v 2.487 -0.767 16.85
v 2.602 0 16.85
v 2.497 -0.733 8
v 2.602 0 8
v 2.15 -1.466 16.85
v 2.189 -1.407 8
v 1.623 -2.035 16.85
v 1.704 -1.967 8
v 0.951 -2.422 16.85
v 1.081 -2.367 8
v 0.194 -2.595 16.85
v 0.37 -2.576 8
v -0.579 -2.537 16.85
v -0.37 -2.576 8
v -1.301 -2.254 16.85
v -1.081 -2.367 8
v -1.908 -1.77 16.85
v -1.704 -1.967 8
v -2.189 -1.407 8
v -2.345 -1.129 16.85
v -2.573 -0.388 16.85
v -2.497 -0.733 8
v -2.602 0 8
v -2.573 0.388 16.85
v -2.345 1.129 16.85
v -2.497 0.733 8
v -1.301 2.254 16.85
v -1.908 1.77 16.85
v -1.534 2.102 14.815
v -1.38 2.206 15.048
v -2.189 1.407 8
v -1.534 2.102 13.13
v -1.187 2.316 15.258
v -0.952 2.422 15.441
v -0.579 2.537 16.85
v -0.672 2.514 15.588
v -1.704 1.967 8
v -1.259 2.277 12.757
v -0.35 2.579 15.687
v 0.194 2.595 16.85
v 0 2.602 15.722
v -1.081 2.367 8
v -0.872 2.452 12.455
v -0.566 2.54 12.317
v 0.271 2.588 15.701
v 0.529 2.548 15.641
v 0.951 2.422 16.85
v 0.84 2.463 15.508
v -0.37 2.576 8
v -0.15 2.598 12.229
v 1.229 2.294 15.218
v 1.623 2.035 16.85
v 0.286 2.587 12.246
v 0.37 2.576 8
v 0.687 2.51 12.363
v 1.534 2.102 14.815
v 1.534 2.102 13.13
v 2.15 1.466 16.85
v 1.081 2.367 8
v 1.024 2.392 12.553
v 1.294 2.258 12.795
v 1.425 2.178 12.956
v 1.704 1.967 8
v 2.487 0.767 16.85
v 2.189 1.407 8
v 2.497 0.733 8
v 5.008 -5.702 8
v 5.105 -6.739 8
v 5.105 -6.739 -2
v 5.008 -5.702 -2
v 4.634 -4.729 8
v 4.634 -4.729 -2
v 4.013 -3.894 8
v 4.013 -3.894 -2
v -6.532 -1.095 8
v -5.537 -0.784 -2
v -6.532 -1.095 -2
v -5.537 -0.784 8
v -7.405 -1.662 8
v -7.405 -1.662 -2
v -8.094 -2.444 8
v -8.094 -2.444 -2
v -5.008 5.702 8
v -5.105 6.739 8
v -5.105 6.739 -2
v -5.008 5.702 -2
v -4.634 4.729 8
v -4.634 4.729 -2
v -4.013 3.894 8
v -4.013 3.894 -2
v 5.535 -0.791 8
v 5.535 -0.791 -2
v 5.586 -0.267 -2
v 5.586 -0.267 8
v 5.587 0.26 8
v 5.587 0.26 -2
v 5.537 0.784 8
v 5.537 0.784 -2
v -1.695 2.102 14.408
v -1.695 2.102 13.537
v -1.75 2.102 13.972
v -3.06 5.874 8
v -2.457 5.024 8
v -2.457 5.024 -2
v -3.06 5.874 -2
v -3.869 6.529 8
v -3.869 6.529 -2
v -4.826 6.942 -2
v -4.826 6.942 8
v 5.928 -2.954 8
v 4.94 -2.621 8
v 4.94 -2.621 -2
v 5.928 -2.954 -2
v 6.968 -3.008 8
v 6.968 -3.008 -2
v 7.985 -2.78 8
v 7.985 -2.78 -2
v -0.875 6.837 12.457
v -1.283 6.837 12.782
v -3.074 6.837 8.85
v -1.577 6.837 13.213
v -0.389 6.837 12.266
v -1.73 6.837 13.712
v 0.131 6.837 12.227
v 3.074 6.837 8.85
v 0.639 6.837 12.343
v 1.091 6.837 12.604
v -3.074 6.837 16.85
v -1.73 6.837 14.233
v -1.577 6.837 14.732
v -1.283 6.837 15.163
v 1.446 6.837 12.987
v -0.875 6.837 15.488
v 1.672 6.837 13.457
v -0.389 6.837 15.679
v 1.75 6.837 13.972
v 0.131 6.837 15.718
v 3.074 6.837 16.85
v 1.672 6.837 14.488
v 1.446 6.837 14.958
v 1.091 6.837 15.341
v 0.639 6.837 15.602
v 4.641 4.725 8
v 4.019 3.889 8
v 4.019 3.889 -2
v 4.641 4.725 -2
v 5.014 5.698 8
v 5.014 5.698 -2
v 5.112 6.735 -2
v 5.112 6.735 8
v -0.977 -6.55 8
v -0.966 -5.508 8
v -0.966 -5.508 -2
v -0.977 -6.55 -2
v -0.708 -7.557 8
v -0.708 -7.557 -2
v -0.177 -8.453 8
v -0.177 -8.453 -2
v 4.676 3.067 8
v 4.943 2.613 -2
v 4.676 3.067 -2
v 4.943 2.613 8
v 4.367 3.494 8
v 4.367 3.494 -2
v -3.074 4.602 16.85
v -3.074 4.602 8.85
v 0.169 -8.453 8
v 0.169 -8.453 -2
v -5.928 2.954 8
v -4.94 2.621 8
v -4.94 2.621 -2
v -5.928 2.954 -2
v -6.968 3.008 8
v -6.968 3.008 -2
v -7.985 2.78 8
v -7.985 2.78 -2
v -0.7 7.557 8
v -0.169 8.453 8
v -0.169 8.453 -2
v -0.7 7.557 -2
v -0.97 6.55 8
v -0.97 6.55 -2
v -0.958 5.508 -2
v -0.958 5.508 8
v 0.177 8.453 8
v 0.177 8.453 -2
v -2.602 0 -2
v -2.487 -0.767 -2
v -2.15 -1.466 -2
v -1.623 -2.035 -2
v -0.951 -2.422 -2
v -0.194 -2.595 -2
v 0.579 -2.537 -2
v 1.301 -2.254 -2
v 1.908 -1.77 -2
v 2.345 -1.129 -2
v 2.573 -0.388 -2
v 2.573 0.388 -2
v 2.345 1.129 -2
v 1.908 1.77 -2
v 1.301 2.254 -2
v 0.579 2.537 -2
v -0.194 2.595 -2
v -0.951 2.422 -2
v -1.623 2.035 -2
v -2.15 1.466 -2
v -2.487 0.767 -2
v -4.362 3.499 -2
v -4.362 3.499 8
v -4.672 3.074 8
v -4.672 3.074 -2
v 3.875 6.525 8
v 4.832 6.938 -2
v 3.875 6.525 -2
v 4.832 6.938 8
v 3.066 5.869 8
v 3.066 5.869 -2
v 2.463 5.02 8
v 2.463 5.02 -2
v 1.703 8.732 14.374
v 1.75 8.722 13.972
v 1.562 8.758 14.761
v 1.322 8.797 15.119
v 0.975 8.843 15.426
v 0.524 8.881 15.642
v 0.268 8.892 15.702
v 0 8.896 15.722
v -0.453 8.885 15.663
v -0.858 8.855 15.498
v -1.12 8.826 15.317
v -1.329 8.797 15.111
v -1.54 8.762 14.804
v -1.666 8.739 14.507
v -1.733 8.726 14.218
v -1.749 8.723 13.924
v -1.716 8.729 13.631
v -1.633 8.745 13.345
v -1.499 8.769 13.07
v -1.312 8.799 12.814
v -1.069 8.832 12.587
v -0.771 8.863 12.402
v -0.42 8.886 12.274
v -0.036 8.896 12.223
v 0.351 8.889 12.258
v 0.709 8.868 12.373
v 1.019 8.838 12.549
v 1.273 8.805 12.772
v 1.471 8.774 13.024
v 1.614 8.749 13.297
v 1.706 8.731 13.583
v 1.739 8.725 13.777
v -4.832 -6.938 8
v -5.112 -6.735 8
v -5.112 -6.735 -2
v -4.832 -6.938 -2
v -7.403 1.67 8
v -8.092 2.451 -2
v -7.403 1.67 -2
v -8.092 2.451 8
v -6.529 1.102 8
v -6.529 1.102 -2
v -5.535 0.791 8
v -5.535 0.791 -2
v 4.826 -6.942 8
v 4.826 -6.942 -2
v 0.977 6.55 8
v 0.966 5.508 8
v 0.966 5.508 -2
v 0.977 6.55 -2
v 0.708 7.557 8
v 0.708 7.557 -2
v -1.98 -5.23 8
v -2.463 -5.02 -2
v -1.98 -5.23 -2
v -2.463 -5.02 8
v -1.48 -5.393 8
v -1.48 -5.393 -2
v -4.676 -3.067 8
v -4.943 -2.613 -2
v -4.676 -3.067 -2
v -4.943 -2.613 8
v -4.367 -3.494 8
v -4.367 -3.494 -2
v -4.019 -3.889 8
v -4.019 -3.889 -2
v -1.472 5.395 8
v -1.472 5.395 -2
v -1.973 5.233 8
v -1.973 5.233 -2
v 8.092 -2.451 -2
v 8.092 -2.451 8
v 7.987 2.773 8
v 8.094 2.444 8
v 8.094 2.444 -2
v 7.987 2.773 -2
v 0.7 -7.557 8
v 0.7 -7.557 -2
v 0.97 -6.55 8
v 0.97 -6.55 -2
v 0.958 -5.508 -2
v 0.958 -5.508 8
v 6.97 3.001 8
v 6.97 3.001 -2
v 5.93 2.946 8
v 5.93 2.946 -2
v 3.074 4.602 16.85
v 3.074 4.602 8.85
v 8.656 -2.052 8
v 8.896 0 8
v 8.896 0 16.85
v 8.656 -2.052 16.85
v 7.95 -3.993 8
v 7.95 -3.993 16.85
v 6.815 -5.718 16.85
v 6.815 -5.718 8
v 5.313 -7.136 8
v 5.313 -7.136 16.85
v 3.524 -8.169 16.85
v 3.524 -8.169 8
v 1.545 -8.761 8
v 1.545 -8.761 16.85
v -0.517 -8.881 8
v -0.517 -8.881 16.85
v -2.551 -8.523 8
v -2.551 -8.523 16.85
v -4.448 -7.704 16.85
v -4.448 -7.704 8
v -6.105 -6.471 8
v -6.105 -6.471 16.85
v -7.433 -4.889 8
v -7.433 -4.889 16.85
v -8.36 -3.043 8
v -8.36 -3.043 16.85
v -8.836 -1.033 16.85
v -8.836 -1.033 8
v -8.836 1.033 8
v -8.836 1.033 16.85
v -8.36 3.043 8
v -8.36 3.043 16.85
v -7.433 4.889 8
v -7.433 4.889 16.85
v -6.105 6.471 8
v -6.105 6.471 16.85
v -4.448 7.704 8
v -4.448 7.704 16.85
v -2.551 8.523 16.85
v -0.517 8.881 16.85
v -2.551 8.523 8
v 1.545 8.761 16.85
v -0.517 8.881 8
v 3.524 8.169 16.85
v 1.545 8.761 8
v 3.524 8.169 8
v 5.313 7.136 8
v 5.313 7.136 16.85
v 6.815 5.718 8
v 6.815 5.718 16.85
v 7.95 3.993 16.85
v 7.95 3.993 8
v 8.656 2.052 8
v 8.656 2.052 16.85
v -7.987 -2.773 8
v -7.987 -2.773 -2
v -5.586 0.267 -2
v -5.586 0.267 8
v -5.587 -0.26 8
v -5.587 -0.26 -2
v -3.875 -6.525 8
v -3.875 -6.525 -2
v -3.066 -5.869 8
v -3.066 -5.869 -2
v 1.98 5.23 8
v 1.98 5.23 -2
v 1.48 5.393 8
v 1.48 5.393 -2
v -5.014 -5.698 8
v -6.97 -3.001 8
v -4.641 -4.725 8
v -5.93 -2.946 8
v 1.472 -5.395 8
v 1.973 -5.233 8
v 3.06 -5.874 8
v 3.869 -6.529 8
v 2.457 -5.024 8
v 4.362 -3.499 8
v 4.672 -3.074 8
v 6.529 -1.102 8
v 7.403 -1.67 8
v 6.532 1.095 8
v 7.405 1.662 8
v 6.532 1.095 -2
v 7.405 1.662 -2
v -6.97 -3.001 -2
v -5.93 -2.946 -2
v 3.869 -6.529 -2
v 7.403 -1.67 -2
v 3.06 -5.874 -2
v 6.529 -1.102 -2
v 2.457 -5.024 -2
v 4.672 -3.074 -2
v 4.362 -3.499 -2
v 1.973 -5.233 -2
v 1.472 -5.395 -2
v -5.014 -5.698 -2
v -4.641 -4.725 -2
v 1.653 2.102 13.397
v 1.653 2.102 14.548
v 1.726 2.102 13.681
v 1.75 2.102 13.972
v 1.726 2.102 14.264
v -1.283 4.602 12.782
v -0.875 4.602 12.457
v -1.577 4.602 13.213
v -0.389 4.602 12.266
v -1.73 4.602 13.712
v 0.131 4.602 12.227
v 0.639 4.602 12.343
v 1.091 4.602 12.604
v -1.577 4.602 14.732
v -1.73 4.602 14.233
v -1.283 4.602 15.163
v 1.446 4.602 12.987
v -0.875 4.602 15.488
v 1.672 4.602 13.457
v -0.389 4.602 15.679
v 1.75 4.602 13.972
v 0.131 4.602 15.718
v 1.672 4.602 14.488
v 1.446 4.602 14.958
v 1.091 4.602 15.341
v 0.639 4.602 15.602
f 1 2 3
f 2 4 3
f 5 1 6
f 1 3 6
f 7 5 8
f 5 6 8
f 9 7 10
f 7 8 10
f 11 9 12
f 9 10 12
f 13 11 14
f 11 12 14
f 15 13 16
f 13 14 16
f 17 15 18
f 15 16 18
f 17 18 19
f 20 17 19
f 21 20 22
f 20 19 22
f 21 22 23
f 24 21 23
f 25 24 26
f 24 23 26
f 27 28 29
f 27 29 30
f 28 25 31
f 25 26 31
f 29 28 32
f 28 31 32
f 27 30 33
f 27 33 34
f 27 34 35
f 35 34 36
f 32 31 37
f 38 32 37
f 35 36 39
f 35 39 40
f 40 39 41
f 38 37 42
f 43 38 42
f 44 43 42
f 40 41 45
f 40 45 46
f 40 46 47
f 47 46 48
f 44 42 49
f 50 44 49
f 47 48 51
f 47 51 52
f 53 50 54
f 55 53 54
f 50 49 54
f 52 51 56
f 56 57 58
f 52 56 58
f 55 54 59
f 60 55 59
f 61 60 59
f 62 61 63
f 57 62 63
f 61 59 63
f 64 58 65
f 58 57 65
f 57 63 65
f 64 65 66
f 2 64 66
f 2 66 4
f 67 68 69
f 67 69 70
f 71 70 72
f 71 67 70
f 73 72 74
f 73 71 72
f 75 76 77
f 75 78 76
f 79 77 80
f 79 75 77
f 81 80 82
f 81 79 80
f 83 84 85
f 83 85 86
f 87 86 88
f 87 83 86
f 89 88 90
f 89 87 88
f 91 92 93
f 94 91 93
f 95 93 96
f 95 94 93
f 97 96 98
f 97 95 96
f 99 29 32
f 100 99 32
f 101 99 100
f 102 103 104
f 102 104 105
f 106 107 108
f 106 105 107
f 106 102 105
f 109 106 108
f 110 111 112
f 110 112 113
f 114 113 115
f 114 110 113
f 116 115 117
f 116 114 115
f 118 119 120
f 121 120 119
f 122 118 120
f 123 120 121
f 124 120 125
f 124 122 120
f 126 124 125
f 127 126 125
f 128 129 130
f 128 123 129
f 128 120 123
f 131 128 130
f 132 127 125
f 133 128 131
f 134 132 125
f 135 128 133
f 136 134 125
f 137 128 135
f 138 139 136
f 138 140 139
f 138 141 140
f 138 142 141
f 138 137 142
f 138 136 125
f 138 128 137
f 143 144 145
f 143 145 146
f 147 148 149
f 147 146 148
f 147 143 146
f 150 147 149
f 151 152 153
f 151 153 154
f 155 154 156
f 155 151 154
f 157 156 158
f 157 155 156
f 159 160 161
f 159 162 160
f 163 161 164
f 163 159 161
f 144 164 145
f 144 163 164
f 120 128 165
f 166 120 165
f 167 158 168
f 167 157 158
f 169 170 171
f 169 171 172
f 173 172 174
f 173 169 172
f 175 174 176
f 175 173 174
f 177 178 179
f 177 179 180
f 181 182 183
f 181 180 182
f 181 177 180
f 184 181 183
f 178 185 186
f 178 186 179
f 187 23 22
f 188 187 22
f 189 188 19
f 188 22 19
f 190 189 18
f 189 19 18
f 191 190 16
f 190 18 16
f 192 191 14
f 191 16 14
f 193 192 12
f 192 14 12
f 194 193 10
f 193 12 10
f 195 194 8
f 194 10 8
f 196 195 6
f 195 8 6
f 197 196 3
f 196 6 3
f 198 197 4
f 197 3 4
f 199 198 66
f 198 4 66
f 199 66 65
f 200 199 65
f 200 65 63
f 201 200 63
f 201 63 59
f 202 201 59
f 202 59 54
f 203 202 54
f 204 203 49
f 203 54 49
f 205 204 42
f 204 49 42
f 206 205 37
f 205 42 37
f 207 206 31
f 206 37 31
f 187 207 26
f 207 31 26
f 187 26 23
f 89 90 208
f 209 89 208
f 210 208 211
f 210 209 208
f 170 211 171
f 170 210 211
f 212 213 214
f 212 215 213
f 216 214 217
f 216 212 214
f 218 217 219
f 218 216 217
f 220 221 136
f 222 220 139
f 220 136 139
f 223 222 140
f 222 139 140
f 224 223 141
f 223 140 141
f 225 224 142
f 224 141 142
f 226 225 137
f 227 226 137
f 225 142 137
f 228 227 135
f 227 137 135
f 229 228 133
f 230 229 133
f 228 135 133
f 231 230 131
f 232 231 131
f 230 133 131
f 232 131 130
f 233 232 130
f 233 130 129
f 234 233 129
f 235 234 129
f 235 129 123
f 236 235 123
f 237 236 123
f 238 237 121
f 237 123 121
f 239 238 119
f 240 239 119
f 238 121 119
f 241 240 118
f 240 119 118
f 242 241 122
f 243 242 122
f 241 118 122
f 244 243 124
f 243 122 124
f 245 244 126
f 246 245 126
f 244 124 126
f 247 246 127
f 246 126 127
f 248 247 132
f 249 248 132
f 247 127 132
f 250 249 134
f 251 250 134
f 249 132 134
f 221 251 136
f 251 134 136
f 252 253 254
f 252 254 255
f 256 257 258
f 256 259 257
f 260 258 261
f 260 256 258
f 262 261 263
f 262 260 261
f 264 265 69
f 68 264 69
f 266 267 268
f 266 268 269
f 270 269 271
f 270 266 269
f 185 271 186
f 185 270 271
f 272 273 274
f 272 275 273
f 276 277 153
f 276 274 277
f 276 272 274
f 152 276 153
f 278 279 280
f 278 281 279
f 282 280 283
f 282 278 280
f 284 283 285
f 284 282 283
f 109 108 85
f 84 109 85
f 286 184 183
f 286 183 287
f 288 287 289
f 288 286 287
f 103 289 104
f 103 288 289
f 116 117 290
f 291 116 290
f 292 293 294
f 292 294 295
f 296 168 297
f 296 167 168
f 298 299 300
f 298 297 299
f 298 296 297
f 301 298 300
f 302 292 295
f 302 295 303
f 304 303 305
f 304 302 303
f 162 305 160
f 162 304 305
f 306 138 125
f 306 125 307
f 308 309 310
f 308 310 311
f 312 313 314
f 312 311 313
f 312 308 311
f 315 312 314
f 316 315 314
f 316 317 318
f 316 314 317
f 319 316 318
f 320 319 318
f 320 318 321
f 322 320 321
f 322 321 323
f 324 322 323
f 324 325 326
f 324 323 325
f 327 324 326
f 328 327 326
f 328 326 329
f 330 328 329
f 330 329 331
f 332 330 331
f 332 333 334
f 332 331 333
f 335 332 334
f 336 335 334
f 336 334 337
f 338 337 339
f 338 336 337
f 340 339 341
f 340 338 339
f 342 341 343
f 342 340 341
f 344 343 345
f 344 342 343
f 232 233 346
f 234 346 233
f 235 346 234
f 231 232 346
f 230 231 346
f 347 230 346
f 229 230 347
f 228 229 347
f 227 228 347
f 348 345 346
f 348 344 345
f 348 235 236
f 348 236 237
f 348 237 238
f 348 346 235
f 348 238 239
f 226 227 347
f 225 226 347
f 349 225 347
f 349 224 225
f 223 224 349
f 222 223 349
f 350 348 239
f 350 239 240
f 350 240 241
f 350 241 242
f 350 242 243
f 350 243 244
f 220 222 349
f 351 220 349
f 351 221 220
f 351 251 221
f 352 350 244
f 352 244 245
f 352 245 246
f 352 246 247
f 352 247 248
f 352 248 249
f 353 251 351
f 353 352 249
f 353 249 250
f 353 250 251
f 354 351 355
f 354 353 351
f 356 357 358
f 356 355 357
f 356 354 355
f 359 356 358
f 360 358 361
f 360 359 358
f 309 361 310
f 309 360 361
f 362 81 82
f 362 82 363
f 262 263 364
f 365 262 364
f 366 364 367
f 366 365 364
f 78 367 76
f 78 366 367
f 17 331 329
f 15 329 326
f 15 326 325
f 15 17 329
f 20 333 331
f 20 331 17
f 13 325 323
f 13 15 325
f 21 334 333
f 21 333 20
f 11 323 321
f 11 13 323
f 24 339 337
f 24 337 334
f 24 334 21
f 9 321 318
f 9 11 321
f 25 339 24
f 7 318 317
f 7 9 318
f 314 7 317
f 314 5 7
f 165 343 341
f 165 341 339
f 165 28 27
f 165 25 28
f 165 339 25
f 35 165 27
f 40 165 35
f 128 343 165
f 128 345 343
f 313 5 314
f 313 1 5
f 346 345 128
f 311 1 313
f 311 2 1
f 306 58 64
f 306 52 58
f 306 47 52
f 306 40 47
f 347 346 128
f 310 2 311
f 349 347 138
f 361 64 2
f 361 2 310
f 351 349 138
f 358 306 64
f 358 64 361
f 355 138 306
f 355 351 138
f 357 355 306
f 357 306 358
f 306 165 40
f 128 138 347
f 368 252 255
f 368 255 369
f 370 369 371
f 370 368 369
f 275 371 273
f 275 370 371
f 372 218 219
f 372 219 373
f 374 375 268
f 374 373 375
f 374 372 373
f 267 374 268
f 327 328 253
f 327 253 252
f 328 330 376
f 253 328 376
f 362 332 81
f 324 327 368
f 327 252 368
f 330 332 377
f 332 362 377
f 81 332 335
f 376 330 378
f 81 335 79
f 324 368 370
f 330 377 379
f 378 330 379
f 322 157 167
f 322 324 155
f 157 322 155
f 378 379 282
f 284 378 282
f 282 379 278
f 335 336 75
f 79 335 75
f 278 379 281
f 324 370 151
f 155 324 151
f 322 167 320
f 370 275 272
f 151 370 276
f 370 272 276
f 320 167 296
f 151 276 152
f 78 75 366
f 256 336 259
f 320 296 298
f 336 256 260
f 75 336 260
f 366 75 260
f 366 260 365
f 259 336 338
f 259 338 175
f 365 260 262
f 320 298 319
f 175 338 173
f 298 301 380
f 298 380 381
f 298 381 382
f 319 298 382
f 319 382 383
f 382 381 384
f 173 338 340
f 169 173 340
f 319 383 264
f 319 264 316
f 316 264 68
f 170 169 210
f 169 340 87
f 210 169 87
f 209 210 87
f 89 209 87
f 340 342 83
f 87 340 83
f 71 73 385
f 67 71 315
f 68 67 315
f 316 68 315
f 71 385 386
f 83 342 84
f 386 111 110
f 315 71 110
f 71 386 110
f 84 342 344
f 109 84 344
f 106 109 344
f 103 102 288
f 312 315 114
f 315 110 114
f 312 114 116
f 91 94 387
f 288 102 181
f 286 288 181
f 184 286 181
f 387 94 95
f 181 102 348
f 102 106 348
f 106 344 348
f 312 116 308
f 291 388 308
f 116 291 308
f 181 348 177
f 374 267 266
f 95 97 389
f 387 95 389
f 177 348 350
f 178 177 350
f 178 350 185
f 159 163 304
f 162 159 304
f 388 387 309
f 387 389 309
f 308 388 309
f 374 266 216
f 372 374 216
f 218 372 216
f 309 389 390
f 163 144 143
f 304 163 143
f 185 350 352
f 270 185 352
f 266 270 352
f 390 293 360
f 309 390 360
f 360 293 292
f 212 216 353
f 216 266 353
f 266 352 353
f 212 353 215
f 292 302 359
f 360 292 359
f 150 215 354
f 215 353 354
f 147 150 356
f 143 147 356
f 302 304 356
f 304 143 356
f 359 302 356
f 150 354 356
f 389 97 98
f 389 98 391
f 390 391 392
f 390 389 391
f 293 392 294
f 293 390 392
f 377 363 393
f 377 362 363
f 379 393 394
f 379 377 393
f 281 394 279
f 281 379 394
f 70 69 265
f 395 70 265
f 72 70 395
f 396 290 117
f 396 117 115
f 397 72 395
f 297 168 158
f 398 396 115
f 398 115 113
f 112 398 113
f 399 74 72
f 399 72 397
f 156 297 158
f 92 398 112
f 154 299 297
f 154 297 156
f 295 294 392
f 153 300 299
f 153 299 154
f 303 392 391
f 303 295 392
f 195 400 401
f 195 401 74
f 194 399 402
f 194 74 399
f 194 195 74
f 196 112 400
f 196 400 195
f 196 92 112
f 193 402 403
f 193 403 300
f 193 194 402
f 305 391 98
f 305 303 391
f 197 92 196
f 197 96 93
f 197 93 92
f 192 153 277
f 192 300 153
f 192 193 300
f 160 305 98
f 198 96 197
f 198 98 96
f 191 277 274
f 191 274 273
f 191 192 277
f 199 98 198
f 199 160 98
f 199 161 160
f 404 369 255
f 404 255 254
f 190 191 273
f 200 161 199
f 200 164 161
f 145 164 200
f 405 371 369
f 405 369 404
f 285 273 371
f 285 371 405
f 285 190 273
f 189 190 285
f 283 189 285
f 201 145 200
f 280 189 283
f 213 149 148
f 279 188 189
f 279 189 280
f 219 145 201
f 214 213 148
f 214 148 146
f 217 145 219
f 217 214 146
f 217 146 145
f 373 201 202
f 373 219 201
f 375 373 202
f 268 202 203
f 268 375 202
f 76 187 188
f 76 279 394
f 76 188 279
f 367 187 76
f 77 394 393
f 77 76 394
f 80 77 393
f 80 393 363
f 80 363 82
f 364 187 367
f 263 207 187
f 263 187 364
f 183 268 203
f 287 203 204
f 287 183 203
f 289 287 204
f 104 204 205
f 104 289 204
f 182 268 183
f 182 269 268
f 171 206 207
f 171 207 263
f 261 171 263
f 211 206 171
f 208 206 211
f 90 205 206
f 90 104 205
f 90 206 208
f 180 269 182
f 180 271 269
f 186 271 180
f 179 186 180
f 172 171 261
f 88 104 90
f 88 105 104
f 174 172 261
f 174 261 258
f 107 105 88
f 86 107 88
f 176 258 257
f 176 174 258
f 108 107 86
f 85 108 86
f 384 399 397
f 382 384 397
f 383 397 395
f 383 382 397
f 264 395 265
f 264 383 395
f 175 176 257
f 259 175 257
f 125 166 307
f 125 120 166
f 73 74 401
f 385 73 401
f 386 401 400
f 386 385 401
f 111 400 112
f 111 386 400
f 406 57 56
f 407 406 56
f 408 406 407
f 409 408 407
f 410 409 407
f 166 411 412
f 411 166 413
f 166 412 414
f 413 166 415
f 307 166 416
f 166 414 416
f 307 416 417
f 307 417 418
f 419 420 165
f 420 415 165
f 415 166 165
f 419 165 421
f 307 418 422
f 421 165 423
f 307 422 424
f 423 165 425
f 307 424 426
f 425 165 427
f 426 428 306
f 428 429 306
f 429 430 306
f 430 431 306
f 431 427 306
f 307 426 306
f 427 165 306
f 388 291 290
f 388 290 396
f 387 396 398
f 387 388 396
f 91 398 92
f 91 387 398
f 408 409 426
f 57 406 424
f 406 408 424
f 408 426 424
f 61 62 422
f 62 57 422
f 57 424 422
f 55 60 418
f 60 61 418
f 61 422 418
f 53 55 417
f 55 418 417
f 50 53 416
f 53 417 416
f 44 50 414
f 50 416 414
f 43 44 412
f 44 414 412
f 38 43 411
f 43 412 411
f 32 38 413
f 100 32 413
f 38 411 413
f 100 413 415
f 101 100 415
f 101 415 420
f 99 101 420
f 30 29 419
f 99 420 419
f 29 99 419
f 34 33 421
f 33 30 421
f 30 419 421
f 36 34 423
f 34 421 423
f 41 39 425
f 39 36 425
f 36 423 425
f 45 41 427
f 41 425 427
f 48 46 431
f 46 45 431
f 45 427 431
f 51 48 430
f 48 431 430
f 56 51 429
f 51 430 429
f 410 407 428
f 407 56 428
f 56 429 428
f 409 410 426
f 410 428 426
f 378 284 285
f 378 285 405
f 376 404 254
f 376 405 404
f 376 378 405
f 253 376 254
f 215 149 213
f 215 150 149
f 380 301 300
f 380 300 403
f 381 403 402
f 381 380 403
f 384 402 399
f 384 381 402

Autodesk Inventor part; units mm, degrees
ref_plane "YZ Plane" through (0, 0, 0) normal (1, 0, 0) x (0, 1, 0)
ref_plane "XZ Plane" through (0, 0, 0) normal (0, 1, 0) x (-1, 0, 0)
ref_plane "XY Plane" through (0, 0, 0) normal (0, 0, 1) x (1, 0, 0)
ref_plane "Work Plane1" through (0, 0, 8) normal (0, 0, 1) x (1, 0, 0)
sketch "Sketch1" plane through (0, 0, 0) normal (0, 0, 1) x (1, 0, 0)
  circle A0 centre (0, 0) radius 2.6023
  line L0 (-0.1767, 8.453) -> (0.1689, 8.453)
  line L1 (0.1689, 8.453) -> (0.9579, 5.5085) construction
  arc A1 (-0.1767, 8.453) -> (-0.9656, 5.5084) centre (2.8217, 6.0717) ccw
  line L2 (-5.1115, 6.7348) -> (-4.8319, 6.9379)
  arc A2 (-2.4629, 5.0195) -> (-4.8319, 6.9379) centre (-5.8579, 3.249) ccw
  line L3 (-4.8319, 6.9379) -> (-2.4629, 5.0195) construction
  arc A3 (-5.1115, 6.7348) -> (-4.0189, 3.8888) centre (-1.286, 6.5706) ccw
  line L4 (-8.0939, 2.4441) -> (-7.9871, 2.7727)
  arc A4 (-4.9429, 2.6132) -> (-7.9871, 2.7727) centre (-6.6488, -0.8147) ccw
  line L5 (-7.9871, 2.7727) -> (-4.9429, 2.6132) construction
  arc A5 (-8.0939, 2.4441) -> (-5.5371, 0.7838) centre (-4.9025, 4.5598) ccw
  line L6 (-7.9847, -2.7801) -> (-8.0915, -2.4515)
  arc A6 (-5.5349, -0.7913) -> (-8.0915, -2.4515) centre (-4.9001, -4.5672) ccw
  line L7 (-8.0915, -2.4515) -> (-5.5349, -0.7913) construction
  arc A7 (-7.9847, -2.7801) -> (-4.9404, -2.6205) centre (-6.6464, 0.8073) ccw
  line L8 (-4.8256, -6.9425) -> (-5.1052, -6.7393)
  arc A8 (-4.0128, -3.8935) -> (-5.1052, -6.7393) centre (-1.2798, -6.5752) ccw
  line L9 (-5.1052, -6.7393) -> (-4.0128, -3.8935) construction
  line L10 (0.1767, -8.453) -> (-0.1689, -8.453)
  arc A9 (-0.9579, -5.5085) -> (-0.1689, -8.453) centre (2.8295, -6.0717) ccw
  line L11 (-0.1689, -8.453) -> (-0.9579, -5.5085) construction
  arc A10 (0.1767, -8.453) -> (0.9656, -5.5084) centre (-2.8217, -6.0717) ccw
  line L12 (5.1115, -6.7348) -> (4.8319, -6.9379)
  arc A11 (2.4629, -5.0195) -> (4.8319, -6.9379) centre (5.8579, -3.249) ccw
  line L13 (4.8319, -6.9379) -> (2.4629, -5.0195) construction
  arc A12 (5.1115, -6.7348) -> (4.0189, -3.8888) centre (1.286, -6.5706) ccw
  line L14 (8.0939, -2.4441) -> (7.9871, -2.7727)
  arc A13 (3.3182, -1.074) -> (8.2332, -2.671) centre (6.6488, 0.8147) ccw
  line L15 (7.9871, -2.7727) -> (4.9429, -2.6132) construction
  line L16 (7.9847, 2.7801) -> (8.0915, 2.4515)
  arc A14 (5.5349, 0.7913) -> (8.0915, 2.4515) centre (4.9001, 4.5672) ccw
  line L17 (8.0915, 2.4515) -> (4.0908, -0.1465) construction
  arc A15 (7.9847, 2.7801) -> (4.9404, 2.6205) centre (6.6464, -0.8073) ccw
  line L18 (4.8256, 6.9425) -> (5.1052, 6.7393)
  arc A16 (4.0128, 3.8935) -> (5.1052, 6.7393) centre (1.2798, 6.5752) ccw
  line L19 (5.1052, 6.7393) -> (4.0128, 3.8935) construction
  arc A17 (-5.5371, 0.7838) -> (-5.536, -0.7919) centre (0, 0) ccw
  arc A18 (-4.0189, 3.8888) -> (-4.9442, 2.6133) centre (0, 0) ccw
  arc A19 (2.4565, 5.0239) -> (0.9575, 5.5098) centre (0, 0) ccw
  arc A20 (4.9404, 2.6205) -> (4.0132, 3.8947) centre (0, 0) ccw
  arc A21 (4.9442, -2.6133) -> (5.536, 0.7919) centre (0, 0) ccw
  arc A22 (2.4639, -5.0203) -> (4.9442, -2.6133) centre (0, 0) ccw
  arc A23 (0.9656, -5.5084) -> (2.4639, -5.0203) centre (0, 0) ccw
  arc A24 (-4.9404, -2.6205) -> (-4.0132, -3.8947) centre (0, 0) ccw
  arc A25 (-2.4565, -5.0239) -> (-0.9575, -5.5098) centre (0, 0) ccw
  arc A26 (0.9579, 5.5085) -> (0.1689, 8.453) centre (-2.8295, 6.0717) ccw
  arc A27 (-2.1474, 2.3039) -> (-1.5764, 2.4536) centre (-2.8295, 6.0717) ccw
  arc A28 (-3.1006, 2.2523) -> (-3.0363, 2.2483) centre (-2.8295, 6.0717) ccw
  arc A29 (4.8256, 6.9425) -> (2.4565, 5.0239) centre (5.8516, 3.2535) ccw
  circle A30 centre (4.9025, -4.5598) radius 3.829
  arc A31 (1.7403, -2.4009) -> (1.7114, -2.4439) centre (4.9025, -4.5598) ccw
  arc A32 (1.1846, -3.6447) -> (1.1248, -3.9359) centre (4.9025, -4.5598) ccw
  arc A33 (-4.8256, -6.9425) -> (-2.4565, -5.0239) centre (-5.8516, -3.2535) ccw
  arc A34 (-2.1424, -2.3034) -> (-2.3452, -1.7153) centre (-5.8516, -3.2535) ccw
  arc A35 (-0.9656, 5.5084) -> (-2.4639, 5.0203) centre (0, 0) ccw
  arc A36 (-4.0189, 3.8888) -> (-4.9442, 2.6133) centre (0, 0) ccw
  point P0 (-0.7682, 6.1639)
  point P1 (0.7605, 6.1646)
  point P2 (-4.2445, 4.5351)
  point P3 (-3.0082, 5.4342)
  point P4 (-6.0996, 1.1741)
  point P5 (-5.6279, 2.6282)
  point P6 (-5.6248, -2.6354)
  point P7 (-6.0979, -1.1817)
  point P8 (-3.0015, -5.4382)
  point P9 (-4.2387, -4.5403)
  point P10 (0.7682, -6.1639)
  point P11 (-0.7605, -6.1646)
  point P12 (4.2445, -4.5351)
  point P13 (3.0082, -5.4342)
  point P14 (6.0996, -1.1741)
  point P15 (5.6279, -2.6282)
  point P16 (5.6248, 2.6354)
  point P17 (6.0979, 1.1817)
  point P18 (3.0015, 5.4382)
  point P19 (4.2387, 4.5403)
sketch "Sketch2" plane through (0, 0, 8) normal (0, 0, 1) x (1, 0, 0)
  circle A0 centre (0, 0) radius 2.6023 projected
  arc A1 (-5.2272, 2.3957) -> (-5.6389, 1.125) centre (0, 0) ccw projected
  circle A2 centre (0, 0) radius 8.8963
  dimension "d8" = 17.7926
extrude "Extrusion2" add sketch "Sketch2" along normal blind 8.85
ref_plane "Work Plane2" through (0, 0, 16.85) normal (0, 0, 1) x (1, 0, 0)
sketch "Sketch3" plane through (0, 0, 16.85) normal (0, 0, 1) x (1, 0, 0)
  circle A0 centre (0, 0) radius 2.6023 projected
  circle A1 centre (0, 0) radius 8.8963 projected
  line L0 (0, 6.8373) -> (3.0745, 6.8373)
  line L1 (3.0745, 6.8373) -> (3.0745, 4.6023)
  line L2 (3.0745, 4.6023) -> (0, 4.6023)
  line L3 (0, 6.8373) -> (-3.0745, 6.8373)
  line L4 (-3.0745, 6.8373) -> (-3.0745, 4.6023)
  line L5 (-3.0745, 4.6023) -> (0, 4.6023)
  line L6 (0, -4.8344) -> (3.0745, -4.8344)
  line L7 (3.0745, -4.8344) -> (3.0745, -7.0696)
  line L8 (3.0745, -7.0696) -> (0, -7.0696)
  line L9 (0, -4.8344) -> (-3.0745, -4.8344)
  line L10 (-3.0745, -4.8344) -> (-3.0745, -7.0696)
  line L11 (-3.0745, -7.0696) -> (0, -7.0696)
  line L12 (0, -9.0696) -> (0, -7.0696)
  line L13 (0, 2.6023) -> (0, 3.7788)
  line L14 (0, 3.7788) -> (0, 4.6023)
  dimension "d10" = 2.235
  dimension "d11" = 2
  dimension "d31" = 2.2352
  dimension "d32" = 6.149
  dimension "d33" = 6.149
extrude "Extrusion3" cut sketch "Sketch3" against normal blind 8 contours L5 L4 L3 L0 L1 L2
ref_plane "Work Plane3" through (-2.75, 6.6023, 16.85) normal (0, -1, 0) x (1, 0, 0)
sketch "Sketch4" plane through (-2.75, 6.6023, 16.85) normal (0, -1, 0) x (1, 0, 0)
  line L0 (5.5, 0) -> (5.5, -8) projected
  line L1 (2.75, 0.553) -> (2.75, -3.197)
  circle A0 centre (2.75, -2.8775) radius 1.75
  point P0 (2.75, -16.85)
  dimension "d14" = 3.75
  dimension "d15" = 3.5
extrude "Extrusion4" cut sketch "Sketch4" along normal mid plane 9
sketch "Sketch5" plane through (0, 0, 8) normal (0, 0, -1) x (-1, 0, 0)
  circle A0 centre (0, 0) radius 2.6023 projected
  circle A1 centre (0, 0) radius 8.8963 projected
  line L0 (-0.1767, 8.453) -> (0.169, 8.453)
  line L1 (0.1689, 8.453) -> (0.9579, 5.5085) construction
  arc A2 (0.9579, 5.5085) -> (0.1689, 8.453) centre (-2.8295, 6.0717) ccw
  circle A3 centre (0, 0) radius 2.6023
  arc A4 (-0.1767, 8.453) -> (-0.9656, 5.5085) centre (2.8217, 6.0717) ccw
  arc A5 (0.9575, 5.5099) -> (0.169, 8.453) centre (-2.8254, 6.0736) ccw
  line L2 (0.1689, 8.453) -> (-0.1767, 8.453)
  arc A6 (-0.1767, 8.453) -> (-0.9656, 5.5085) centre (2.8217, 6.0717) ccw
  line L3 (-5.1115, 6.7348) -> (-4.8318, 6.9379)
  line L4 (-4.8319, 6.9379) -> (-2.4629, 5.0195) construction
  arc A7 (-2.4629, 5.0195) -> (-4.8319, 6.9379) centre (-5.8579, 3.249) ccw
  arc A8 (-5.1115, 6.7348) -> (-4.019, 3.8889) centre (-1.286, 6.5706) ccw
  arc A9 (-2.464, 5.0204) -> (-4.8318, 6.9379) centre (-5.8558, 3.2529) ccw
  line L5 (-4.8319, 6.9379) -> (-5.1115, 6.7348)
  arc A10 (-5.1115, 6.7348) -> (-4.019, 3.8889) centre (-1.286, 6.5706) ccw
  line L6 (-8.0939, 2.4441) -> (-7.987, 2.7728)
  line L7 (-7.9871, 2.7727) -> (-4.9429, 2.6132) construction
  arc A11 (-4.9429, 2.6132) -> (-7.9871, 2.7727) centre (-6.6488, -0.8147) ccw
  arc A12 (-8.0939, 2.4441) -> (-5.5373, 0.7839) centre (-4.9025, 4.5598) ccw
  arc A13 (-4.9444, 2.6133) -> (-7.987, 2.7728) centre (-6.6494, -0.8103) ccw
  line L8 (-7.9871, 2.7727) -> (-8.0939, 2.4441)
  arc A14 (-8.0939, 2.4441) -> (-5.5373, 0.7839) centre (-4.9025, 4.5598) ccw
  line L9 (-7.9847, -2.7801) -> (-8.0915, -2.4514)
  line L10 (-8.0915, -2.4515) -> (-5.5349, -0.7913) construction
  arc A15 (-5.5349, -0.7913) -> (-8.0915, -2.4515) centre (-4.9001, -4.5672) ccw
  arc A16 (-7.9847, -2.7801) -> (-4.9405, -2.6206) centre (-6.6464, 0.8073) ccw
  arc A17 (-5.5361, -0.792) -> (-8.0915, -2.4514) centre (-4.9032, -4.564) ccw
  line L11 (-8.0915, -2.4515) -> (-7.9847, -2.7801)
  arc A18 (-7.9847, -2.7801) -> (-4.9405, -2.6206) centre (-6.6464, 0.8073) ccw
  line L12 (-4.8256, -6.9425) -> (-5.1053, -6.7393)
  line L13 (-5.1052, -6.7393) -> (-4.0128, -3.8935) construction
  arc A19 (-4.0128, -3.8935) -> (-5.1052, -6.7393) centre (-1.2798, -6.5752) ccw
  arc A20 (-4.8256, -6.9425) -> (-2.4566, -5.0241) centre (-5.8516, -3.2535) ccw
  arc A21 (-4.0133, -3.8948) -> (-5.1053, -6.7393) centre (-1.2842, -6.5744) ccw
  line L14 (-5.1052, -6.7393) -> (-4.8256, -6.9425)
  arc A22 (-4.8256, -6.9425) -> (-2.4566, -5.0241) centre (-5.8516, -3.2535) ccw
  line L15 (0.1767, -8.453) -> (-0.169, -8.453)
  line L16 (-0.1689, -8.453) -> (-0.9579, -5.5085) construction
  arc A23 (-0.9579, -5.5085) -> (-0.1689, -8.453) centre (2.8295, -6.0717) ccw
  arc A24 (0.1767, -8.453) -> (0.9656, -5.5085) centre (-2.8217, -6.0717) ccw
  arc A25 (-0.9575, -5.5099) -> (-0.169, -8.453) centre (2.8254, -6.0736) ccw
  line L17 (-0.1689, -8.453) -> (0.1767, -8.453)
  arc A26 (0.1767, -8.453) -> (0.9656, -5.5085) centre (-2.8217, -6.0717) ccw
  line L18 (5.1115, -6.7348) -> (4.8318, -6.9379)
  line L19 (4.8319, -6.9379) -> (2.4629, -5.0195) construction
  arc A27 (2.4629, -5.0195) -> (4.8319, -6.9379) centre (5.8579, -3.249) ccw
  arc A28 (5.1115, -6.7348) -> (4.019, -3.8889) centre (1.286, -6.5706) ccw
  arc A29 (2.464, -5.0204) -> (4.8318, -6.9379) centre (5.8558, -3.2529) ccw
  line L20 (4.8319, -6.9379) -> (5.1115, -6.7348)
  arc A30 (5.1115, -6.7348) -> (4.019, -3.8889) centre (1.286, -6.5706) ccw
  line L21 (8.0939, -2.4441) -> (7.987, -2.7728)
  line L22 (7.9871, -2.7727) -> (4.9429, -2.6132) construction
  arc A31 (4.9429, -2.6132) -> (7.9871, -2.7727) centre (6.6488, 0.8147) ccw
  arc A32 (8.0939, -2.4441) -> (5.5373, -0.7839) centre (4.9025, -4.5598) ccw
  arc A33 (4.9444, -2.6133) -> (7.987, -2.7728) centre (6.6494, 0.8103) ccw
  line L23 (7.9871, -2.7727) -> (8.0939, -2.4441)
  arc A34 (8.0939, -2.4441) -> (5.5373, -0.7839) centre (4.9025, -4.5598) ccw
  line L24 (7.9847, 2.7801) -> (8.0915, 2.4514)
  line L25 (8.0915, 2.4515) -> (5.5349, 0.7913) construction
  arc A35 (5.5349, 0.7913) -> (8.0915, 2.4515) centre (4.9001, 4.5672) ccw
  arc A36 (7.9847, 2.7801) -> (4.9405, 2.6206) centre (6.6464, -0.8073) ccw
  arc A37 (5.5361, 0.792) -> (8.0915, 2.4514) centre (4.9032, 4.564) ccw
  line L26 (8.0915, 2.4515) -> (7.9847, 2.7801)
  arc A38 (7.9847, 2.7801) -> (4.9405, 2.6206) centre (6.6464, -0.8073) ccw
  line L27 (4.8256, 6.9425) -> (5.1053, 6.7393)
  line L28 (5.1052, 6.7393) -> (4.0128, 3.8935) construction
  arc A39 (4.0128, 3.8935) -> (5.1052, 6.7393) centre (1.2798, 6.5752) ccw
  arc A40 (4.8256, 6.9425) -> (2.4566, 5.0241) centre (5.8516, 3.2535) ccw
  arc A41 (4.0133, 3.8948) -> (5.1053, 6.7393) centre (1.2842, 6.5744) ccw
  line L29 (5.1052, 6.7393) -> (4.8256, 6.9425)
  arc A42 (4.8256, 6.9425) -> (2.4566, 5.0241) centre (5.8516, 3.2535) ccw
  arc A43 (2.4566, 5.0241) -> (0.9575, 5.5099) centre (0, 0) ccw
  arc A44 (4.9405, 2.6206) -> (4.0133, 3.8948) centre (0, 0) ccw
  arc A45 (5.5373, -0.7839) -> (5.5361, 0.792) centre (0, 0) ccw
  arc A46 (4.019, -3.8889) -> (4.9444, -2.6133) centre (0, 0) ccw
  arc A47 (0.9656, -5.5085) -> (2.464, -5.0204) centre (0, 0) ccw
  arc A48 (-2.4566, -5.0241) -> (-0.9575, -5.5099) centre (0, 0) ccw
  arc A49 (-4.9405, -2.6206) -> (-4.0133, -3.8948) centre (0, 0) ccw
  arc A50 (-5.5373, 0.7839) -> (-5.5361, -0.792) centre (0, 0) ccw
  arc A51 (-0.9656, 5.5085) -> (-2.464, 5.0204) centre (0, 0) ccw
  arc A52 (-4.019, 3.8889) -> (-4.9444, 2.6133) centre (0, 0) ccw
  point P0 (-0.7682, 6.1639)
  point P1 (0.7605, 6.1646)
  point P2 (-1.286, 6.5706)
  point P3 (1.2798, 6.5752)
  point P4 (0.9575, 5.5098)
  point P5 (-4.9025, 4.5598)
  point P6 (-4.2445, 4.5351)
  point P7 (-2.4639, 5.0203)
  point P8 (-3.0082, 5.4342)
  point P9 (-2.8295, 6.0717)
  point P10 (-6.6464, 0.8073)
  point P11 (-6.0996, 1.1741)
  point P12 (-4.9442, 2.6133)
  point P13 (-5.6279, 2.6282)
  point P14 (-5.8579, 3.249)
  point P15 (-5.8516, -3.2535)
  point P16 (-5.6248, -2.6354)
  point P17 (-5.536, -0.7919)
  point P18 (-6.0979, -1.1817)
  point P19 (-6.6488, -0.8147)
  point P20 (-2.8217, -6.0717)
  point P21 (-3.0015, -5.4382)
  point P22 (-4.0132, -3.8947)
  point P23 (-4.2387, -4.5403)
  point P24 (-4.9001, -4.5672)
  point P25 (1.286, -6.5706)
  point P26 (0.7682, -6.1639)
  point P27 (-0.9575, -5.5098)
  point P28 (-0.7605, -6.1646)
  point P29 (-1.2798, -6.5752)
  point P30 (4.9025, -4.5598)
  point P31 (4.2445, -4.5351)
  point P32 (2.4639, -5.0203)
  point P33 (3.0082, -5.4342)
  point P34 (2.8295, -6.0717)
  point P35 (6.6464, -0.8073)
  point P36 (6.0996, -1.1741)
  point P37 (4.9442, -2.6133)
  point P38 (5.6279, -2.6282)
  point P39 (5.8579, -3.249)
  point P40 (5.8516, 3.2535)
  point P41 (5.6248, 2.6354)
  point P42 (5.536, 0.7919)
  point P43 (6.0979, 1.1817)
  point P44 (6.6488, 0.8147)
  point P45 (2.8217, 6.0717)
  point P46 (3.0015, 5.4382)
  point P47 (4.0132, 3.8947)
  point P48 (4.2387, 4.5403)
  point P49 (4.9001, 4.5672)
  dimension "d27" = 360
extrude "Extrusion5" add sketch "Sketch5" along normal blind 10 contours L0 A2 A43 A40 L27 A39 A44 A36 L24 A35 A45 A32 L21 A31 A46 A28 L18 A27 A47 A24 L15 A23 A48 A20 L12 A19 A49 A16 L9 A15 A50 A12 L6 A11 A52 A8 L3 A7 A51 A4
properties part number "sj-small-gear"
